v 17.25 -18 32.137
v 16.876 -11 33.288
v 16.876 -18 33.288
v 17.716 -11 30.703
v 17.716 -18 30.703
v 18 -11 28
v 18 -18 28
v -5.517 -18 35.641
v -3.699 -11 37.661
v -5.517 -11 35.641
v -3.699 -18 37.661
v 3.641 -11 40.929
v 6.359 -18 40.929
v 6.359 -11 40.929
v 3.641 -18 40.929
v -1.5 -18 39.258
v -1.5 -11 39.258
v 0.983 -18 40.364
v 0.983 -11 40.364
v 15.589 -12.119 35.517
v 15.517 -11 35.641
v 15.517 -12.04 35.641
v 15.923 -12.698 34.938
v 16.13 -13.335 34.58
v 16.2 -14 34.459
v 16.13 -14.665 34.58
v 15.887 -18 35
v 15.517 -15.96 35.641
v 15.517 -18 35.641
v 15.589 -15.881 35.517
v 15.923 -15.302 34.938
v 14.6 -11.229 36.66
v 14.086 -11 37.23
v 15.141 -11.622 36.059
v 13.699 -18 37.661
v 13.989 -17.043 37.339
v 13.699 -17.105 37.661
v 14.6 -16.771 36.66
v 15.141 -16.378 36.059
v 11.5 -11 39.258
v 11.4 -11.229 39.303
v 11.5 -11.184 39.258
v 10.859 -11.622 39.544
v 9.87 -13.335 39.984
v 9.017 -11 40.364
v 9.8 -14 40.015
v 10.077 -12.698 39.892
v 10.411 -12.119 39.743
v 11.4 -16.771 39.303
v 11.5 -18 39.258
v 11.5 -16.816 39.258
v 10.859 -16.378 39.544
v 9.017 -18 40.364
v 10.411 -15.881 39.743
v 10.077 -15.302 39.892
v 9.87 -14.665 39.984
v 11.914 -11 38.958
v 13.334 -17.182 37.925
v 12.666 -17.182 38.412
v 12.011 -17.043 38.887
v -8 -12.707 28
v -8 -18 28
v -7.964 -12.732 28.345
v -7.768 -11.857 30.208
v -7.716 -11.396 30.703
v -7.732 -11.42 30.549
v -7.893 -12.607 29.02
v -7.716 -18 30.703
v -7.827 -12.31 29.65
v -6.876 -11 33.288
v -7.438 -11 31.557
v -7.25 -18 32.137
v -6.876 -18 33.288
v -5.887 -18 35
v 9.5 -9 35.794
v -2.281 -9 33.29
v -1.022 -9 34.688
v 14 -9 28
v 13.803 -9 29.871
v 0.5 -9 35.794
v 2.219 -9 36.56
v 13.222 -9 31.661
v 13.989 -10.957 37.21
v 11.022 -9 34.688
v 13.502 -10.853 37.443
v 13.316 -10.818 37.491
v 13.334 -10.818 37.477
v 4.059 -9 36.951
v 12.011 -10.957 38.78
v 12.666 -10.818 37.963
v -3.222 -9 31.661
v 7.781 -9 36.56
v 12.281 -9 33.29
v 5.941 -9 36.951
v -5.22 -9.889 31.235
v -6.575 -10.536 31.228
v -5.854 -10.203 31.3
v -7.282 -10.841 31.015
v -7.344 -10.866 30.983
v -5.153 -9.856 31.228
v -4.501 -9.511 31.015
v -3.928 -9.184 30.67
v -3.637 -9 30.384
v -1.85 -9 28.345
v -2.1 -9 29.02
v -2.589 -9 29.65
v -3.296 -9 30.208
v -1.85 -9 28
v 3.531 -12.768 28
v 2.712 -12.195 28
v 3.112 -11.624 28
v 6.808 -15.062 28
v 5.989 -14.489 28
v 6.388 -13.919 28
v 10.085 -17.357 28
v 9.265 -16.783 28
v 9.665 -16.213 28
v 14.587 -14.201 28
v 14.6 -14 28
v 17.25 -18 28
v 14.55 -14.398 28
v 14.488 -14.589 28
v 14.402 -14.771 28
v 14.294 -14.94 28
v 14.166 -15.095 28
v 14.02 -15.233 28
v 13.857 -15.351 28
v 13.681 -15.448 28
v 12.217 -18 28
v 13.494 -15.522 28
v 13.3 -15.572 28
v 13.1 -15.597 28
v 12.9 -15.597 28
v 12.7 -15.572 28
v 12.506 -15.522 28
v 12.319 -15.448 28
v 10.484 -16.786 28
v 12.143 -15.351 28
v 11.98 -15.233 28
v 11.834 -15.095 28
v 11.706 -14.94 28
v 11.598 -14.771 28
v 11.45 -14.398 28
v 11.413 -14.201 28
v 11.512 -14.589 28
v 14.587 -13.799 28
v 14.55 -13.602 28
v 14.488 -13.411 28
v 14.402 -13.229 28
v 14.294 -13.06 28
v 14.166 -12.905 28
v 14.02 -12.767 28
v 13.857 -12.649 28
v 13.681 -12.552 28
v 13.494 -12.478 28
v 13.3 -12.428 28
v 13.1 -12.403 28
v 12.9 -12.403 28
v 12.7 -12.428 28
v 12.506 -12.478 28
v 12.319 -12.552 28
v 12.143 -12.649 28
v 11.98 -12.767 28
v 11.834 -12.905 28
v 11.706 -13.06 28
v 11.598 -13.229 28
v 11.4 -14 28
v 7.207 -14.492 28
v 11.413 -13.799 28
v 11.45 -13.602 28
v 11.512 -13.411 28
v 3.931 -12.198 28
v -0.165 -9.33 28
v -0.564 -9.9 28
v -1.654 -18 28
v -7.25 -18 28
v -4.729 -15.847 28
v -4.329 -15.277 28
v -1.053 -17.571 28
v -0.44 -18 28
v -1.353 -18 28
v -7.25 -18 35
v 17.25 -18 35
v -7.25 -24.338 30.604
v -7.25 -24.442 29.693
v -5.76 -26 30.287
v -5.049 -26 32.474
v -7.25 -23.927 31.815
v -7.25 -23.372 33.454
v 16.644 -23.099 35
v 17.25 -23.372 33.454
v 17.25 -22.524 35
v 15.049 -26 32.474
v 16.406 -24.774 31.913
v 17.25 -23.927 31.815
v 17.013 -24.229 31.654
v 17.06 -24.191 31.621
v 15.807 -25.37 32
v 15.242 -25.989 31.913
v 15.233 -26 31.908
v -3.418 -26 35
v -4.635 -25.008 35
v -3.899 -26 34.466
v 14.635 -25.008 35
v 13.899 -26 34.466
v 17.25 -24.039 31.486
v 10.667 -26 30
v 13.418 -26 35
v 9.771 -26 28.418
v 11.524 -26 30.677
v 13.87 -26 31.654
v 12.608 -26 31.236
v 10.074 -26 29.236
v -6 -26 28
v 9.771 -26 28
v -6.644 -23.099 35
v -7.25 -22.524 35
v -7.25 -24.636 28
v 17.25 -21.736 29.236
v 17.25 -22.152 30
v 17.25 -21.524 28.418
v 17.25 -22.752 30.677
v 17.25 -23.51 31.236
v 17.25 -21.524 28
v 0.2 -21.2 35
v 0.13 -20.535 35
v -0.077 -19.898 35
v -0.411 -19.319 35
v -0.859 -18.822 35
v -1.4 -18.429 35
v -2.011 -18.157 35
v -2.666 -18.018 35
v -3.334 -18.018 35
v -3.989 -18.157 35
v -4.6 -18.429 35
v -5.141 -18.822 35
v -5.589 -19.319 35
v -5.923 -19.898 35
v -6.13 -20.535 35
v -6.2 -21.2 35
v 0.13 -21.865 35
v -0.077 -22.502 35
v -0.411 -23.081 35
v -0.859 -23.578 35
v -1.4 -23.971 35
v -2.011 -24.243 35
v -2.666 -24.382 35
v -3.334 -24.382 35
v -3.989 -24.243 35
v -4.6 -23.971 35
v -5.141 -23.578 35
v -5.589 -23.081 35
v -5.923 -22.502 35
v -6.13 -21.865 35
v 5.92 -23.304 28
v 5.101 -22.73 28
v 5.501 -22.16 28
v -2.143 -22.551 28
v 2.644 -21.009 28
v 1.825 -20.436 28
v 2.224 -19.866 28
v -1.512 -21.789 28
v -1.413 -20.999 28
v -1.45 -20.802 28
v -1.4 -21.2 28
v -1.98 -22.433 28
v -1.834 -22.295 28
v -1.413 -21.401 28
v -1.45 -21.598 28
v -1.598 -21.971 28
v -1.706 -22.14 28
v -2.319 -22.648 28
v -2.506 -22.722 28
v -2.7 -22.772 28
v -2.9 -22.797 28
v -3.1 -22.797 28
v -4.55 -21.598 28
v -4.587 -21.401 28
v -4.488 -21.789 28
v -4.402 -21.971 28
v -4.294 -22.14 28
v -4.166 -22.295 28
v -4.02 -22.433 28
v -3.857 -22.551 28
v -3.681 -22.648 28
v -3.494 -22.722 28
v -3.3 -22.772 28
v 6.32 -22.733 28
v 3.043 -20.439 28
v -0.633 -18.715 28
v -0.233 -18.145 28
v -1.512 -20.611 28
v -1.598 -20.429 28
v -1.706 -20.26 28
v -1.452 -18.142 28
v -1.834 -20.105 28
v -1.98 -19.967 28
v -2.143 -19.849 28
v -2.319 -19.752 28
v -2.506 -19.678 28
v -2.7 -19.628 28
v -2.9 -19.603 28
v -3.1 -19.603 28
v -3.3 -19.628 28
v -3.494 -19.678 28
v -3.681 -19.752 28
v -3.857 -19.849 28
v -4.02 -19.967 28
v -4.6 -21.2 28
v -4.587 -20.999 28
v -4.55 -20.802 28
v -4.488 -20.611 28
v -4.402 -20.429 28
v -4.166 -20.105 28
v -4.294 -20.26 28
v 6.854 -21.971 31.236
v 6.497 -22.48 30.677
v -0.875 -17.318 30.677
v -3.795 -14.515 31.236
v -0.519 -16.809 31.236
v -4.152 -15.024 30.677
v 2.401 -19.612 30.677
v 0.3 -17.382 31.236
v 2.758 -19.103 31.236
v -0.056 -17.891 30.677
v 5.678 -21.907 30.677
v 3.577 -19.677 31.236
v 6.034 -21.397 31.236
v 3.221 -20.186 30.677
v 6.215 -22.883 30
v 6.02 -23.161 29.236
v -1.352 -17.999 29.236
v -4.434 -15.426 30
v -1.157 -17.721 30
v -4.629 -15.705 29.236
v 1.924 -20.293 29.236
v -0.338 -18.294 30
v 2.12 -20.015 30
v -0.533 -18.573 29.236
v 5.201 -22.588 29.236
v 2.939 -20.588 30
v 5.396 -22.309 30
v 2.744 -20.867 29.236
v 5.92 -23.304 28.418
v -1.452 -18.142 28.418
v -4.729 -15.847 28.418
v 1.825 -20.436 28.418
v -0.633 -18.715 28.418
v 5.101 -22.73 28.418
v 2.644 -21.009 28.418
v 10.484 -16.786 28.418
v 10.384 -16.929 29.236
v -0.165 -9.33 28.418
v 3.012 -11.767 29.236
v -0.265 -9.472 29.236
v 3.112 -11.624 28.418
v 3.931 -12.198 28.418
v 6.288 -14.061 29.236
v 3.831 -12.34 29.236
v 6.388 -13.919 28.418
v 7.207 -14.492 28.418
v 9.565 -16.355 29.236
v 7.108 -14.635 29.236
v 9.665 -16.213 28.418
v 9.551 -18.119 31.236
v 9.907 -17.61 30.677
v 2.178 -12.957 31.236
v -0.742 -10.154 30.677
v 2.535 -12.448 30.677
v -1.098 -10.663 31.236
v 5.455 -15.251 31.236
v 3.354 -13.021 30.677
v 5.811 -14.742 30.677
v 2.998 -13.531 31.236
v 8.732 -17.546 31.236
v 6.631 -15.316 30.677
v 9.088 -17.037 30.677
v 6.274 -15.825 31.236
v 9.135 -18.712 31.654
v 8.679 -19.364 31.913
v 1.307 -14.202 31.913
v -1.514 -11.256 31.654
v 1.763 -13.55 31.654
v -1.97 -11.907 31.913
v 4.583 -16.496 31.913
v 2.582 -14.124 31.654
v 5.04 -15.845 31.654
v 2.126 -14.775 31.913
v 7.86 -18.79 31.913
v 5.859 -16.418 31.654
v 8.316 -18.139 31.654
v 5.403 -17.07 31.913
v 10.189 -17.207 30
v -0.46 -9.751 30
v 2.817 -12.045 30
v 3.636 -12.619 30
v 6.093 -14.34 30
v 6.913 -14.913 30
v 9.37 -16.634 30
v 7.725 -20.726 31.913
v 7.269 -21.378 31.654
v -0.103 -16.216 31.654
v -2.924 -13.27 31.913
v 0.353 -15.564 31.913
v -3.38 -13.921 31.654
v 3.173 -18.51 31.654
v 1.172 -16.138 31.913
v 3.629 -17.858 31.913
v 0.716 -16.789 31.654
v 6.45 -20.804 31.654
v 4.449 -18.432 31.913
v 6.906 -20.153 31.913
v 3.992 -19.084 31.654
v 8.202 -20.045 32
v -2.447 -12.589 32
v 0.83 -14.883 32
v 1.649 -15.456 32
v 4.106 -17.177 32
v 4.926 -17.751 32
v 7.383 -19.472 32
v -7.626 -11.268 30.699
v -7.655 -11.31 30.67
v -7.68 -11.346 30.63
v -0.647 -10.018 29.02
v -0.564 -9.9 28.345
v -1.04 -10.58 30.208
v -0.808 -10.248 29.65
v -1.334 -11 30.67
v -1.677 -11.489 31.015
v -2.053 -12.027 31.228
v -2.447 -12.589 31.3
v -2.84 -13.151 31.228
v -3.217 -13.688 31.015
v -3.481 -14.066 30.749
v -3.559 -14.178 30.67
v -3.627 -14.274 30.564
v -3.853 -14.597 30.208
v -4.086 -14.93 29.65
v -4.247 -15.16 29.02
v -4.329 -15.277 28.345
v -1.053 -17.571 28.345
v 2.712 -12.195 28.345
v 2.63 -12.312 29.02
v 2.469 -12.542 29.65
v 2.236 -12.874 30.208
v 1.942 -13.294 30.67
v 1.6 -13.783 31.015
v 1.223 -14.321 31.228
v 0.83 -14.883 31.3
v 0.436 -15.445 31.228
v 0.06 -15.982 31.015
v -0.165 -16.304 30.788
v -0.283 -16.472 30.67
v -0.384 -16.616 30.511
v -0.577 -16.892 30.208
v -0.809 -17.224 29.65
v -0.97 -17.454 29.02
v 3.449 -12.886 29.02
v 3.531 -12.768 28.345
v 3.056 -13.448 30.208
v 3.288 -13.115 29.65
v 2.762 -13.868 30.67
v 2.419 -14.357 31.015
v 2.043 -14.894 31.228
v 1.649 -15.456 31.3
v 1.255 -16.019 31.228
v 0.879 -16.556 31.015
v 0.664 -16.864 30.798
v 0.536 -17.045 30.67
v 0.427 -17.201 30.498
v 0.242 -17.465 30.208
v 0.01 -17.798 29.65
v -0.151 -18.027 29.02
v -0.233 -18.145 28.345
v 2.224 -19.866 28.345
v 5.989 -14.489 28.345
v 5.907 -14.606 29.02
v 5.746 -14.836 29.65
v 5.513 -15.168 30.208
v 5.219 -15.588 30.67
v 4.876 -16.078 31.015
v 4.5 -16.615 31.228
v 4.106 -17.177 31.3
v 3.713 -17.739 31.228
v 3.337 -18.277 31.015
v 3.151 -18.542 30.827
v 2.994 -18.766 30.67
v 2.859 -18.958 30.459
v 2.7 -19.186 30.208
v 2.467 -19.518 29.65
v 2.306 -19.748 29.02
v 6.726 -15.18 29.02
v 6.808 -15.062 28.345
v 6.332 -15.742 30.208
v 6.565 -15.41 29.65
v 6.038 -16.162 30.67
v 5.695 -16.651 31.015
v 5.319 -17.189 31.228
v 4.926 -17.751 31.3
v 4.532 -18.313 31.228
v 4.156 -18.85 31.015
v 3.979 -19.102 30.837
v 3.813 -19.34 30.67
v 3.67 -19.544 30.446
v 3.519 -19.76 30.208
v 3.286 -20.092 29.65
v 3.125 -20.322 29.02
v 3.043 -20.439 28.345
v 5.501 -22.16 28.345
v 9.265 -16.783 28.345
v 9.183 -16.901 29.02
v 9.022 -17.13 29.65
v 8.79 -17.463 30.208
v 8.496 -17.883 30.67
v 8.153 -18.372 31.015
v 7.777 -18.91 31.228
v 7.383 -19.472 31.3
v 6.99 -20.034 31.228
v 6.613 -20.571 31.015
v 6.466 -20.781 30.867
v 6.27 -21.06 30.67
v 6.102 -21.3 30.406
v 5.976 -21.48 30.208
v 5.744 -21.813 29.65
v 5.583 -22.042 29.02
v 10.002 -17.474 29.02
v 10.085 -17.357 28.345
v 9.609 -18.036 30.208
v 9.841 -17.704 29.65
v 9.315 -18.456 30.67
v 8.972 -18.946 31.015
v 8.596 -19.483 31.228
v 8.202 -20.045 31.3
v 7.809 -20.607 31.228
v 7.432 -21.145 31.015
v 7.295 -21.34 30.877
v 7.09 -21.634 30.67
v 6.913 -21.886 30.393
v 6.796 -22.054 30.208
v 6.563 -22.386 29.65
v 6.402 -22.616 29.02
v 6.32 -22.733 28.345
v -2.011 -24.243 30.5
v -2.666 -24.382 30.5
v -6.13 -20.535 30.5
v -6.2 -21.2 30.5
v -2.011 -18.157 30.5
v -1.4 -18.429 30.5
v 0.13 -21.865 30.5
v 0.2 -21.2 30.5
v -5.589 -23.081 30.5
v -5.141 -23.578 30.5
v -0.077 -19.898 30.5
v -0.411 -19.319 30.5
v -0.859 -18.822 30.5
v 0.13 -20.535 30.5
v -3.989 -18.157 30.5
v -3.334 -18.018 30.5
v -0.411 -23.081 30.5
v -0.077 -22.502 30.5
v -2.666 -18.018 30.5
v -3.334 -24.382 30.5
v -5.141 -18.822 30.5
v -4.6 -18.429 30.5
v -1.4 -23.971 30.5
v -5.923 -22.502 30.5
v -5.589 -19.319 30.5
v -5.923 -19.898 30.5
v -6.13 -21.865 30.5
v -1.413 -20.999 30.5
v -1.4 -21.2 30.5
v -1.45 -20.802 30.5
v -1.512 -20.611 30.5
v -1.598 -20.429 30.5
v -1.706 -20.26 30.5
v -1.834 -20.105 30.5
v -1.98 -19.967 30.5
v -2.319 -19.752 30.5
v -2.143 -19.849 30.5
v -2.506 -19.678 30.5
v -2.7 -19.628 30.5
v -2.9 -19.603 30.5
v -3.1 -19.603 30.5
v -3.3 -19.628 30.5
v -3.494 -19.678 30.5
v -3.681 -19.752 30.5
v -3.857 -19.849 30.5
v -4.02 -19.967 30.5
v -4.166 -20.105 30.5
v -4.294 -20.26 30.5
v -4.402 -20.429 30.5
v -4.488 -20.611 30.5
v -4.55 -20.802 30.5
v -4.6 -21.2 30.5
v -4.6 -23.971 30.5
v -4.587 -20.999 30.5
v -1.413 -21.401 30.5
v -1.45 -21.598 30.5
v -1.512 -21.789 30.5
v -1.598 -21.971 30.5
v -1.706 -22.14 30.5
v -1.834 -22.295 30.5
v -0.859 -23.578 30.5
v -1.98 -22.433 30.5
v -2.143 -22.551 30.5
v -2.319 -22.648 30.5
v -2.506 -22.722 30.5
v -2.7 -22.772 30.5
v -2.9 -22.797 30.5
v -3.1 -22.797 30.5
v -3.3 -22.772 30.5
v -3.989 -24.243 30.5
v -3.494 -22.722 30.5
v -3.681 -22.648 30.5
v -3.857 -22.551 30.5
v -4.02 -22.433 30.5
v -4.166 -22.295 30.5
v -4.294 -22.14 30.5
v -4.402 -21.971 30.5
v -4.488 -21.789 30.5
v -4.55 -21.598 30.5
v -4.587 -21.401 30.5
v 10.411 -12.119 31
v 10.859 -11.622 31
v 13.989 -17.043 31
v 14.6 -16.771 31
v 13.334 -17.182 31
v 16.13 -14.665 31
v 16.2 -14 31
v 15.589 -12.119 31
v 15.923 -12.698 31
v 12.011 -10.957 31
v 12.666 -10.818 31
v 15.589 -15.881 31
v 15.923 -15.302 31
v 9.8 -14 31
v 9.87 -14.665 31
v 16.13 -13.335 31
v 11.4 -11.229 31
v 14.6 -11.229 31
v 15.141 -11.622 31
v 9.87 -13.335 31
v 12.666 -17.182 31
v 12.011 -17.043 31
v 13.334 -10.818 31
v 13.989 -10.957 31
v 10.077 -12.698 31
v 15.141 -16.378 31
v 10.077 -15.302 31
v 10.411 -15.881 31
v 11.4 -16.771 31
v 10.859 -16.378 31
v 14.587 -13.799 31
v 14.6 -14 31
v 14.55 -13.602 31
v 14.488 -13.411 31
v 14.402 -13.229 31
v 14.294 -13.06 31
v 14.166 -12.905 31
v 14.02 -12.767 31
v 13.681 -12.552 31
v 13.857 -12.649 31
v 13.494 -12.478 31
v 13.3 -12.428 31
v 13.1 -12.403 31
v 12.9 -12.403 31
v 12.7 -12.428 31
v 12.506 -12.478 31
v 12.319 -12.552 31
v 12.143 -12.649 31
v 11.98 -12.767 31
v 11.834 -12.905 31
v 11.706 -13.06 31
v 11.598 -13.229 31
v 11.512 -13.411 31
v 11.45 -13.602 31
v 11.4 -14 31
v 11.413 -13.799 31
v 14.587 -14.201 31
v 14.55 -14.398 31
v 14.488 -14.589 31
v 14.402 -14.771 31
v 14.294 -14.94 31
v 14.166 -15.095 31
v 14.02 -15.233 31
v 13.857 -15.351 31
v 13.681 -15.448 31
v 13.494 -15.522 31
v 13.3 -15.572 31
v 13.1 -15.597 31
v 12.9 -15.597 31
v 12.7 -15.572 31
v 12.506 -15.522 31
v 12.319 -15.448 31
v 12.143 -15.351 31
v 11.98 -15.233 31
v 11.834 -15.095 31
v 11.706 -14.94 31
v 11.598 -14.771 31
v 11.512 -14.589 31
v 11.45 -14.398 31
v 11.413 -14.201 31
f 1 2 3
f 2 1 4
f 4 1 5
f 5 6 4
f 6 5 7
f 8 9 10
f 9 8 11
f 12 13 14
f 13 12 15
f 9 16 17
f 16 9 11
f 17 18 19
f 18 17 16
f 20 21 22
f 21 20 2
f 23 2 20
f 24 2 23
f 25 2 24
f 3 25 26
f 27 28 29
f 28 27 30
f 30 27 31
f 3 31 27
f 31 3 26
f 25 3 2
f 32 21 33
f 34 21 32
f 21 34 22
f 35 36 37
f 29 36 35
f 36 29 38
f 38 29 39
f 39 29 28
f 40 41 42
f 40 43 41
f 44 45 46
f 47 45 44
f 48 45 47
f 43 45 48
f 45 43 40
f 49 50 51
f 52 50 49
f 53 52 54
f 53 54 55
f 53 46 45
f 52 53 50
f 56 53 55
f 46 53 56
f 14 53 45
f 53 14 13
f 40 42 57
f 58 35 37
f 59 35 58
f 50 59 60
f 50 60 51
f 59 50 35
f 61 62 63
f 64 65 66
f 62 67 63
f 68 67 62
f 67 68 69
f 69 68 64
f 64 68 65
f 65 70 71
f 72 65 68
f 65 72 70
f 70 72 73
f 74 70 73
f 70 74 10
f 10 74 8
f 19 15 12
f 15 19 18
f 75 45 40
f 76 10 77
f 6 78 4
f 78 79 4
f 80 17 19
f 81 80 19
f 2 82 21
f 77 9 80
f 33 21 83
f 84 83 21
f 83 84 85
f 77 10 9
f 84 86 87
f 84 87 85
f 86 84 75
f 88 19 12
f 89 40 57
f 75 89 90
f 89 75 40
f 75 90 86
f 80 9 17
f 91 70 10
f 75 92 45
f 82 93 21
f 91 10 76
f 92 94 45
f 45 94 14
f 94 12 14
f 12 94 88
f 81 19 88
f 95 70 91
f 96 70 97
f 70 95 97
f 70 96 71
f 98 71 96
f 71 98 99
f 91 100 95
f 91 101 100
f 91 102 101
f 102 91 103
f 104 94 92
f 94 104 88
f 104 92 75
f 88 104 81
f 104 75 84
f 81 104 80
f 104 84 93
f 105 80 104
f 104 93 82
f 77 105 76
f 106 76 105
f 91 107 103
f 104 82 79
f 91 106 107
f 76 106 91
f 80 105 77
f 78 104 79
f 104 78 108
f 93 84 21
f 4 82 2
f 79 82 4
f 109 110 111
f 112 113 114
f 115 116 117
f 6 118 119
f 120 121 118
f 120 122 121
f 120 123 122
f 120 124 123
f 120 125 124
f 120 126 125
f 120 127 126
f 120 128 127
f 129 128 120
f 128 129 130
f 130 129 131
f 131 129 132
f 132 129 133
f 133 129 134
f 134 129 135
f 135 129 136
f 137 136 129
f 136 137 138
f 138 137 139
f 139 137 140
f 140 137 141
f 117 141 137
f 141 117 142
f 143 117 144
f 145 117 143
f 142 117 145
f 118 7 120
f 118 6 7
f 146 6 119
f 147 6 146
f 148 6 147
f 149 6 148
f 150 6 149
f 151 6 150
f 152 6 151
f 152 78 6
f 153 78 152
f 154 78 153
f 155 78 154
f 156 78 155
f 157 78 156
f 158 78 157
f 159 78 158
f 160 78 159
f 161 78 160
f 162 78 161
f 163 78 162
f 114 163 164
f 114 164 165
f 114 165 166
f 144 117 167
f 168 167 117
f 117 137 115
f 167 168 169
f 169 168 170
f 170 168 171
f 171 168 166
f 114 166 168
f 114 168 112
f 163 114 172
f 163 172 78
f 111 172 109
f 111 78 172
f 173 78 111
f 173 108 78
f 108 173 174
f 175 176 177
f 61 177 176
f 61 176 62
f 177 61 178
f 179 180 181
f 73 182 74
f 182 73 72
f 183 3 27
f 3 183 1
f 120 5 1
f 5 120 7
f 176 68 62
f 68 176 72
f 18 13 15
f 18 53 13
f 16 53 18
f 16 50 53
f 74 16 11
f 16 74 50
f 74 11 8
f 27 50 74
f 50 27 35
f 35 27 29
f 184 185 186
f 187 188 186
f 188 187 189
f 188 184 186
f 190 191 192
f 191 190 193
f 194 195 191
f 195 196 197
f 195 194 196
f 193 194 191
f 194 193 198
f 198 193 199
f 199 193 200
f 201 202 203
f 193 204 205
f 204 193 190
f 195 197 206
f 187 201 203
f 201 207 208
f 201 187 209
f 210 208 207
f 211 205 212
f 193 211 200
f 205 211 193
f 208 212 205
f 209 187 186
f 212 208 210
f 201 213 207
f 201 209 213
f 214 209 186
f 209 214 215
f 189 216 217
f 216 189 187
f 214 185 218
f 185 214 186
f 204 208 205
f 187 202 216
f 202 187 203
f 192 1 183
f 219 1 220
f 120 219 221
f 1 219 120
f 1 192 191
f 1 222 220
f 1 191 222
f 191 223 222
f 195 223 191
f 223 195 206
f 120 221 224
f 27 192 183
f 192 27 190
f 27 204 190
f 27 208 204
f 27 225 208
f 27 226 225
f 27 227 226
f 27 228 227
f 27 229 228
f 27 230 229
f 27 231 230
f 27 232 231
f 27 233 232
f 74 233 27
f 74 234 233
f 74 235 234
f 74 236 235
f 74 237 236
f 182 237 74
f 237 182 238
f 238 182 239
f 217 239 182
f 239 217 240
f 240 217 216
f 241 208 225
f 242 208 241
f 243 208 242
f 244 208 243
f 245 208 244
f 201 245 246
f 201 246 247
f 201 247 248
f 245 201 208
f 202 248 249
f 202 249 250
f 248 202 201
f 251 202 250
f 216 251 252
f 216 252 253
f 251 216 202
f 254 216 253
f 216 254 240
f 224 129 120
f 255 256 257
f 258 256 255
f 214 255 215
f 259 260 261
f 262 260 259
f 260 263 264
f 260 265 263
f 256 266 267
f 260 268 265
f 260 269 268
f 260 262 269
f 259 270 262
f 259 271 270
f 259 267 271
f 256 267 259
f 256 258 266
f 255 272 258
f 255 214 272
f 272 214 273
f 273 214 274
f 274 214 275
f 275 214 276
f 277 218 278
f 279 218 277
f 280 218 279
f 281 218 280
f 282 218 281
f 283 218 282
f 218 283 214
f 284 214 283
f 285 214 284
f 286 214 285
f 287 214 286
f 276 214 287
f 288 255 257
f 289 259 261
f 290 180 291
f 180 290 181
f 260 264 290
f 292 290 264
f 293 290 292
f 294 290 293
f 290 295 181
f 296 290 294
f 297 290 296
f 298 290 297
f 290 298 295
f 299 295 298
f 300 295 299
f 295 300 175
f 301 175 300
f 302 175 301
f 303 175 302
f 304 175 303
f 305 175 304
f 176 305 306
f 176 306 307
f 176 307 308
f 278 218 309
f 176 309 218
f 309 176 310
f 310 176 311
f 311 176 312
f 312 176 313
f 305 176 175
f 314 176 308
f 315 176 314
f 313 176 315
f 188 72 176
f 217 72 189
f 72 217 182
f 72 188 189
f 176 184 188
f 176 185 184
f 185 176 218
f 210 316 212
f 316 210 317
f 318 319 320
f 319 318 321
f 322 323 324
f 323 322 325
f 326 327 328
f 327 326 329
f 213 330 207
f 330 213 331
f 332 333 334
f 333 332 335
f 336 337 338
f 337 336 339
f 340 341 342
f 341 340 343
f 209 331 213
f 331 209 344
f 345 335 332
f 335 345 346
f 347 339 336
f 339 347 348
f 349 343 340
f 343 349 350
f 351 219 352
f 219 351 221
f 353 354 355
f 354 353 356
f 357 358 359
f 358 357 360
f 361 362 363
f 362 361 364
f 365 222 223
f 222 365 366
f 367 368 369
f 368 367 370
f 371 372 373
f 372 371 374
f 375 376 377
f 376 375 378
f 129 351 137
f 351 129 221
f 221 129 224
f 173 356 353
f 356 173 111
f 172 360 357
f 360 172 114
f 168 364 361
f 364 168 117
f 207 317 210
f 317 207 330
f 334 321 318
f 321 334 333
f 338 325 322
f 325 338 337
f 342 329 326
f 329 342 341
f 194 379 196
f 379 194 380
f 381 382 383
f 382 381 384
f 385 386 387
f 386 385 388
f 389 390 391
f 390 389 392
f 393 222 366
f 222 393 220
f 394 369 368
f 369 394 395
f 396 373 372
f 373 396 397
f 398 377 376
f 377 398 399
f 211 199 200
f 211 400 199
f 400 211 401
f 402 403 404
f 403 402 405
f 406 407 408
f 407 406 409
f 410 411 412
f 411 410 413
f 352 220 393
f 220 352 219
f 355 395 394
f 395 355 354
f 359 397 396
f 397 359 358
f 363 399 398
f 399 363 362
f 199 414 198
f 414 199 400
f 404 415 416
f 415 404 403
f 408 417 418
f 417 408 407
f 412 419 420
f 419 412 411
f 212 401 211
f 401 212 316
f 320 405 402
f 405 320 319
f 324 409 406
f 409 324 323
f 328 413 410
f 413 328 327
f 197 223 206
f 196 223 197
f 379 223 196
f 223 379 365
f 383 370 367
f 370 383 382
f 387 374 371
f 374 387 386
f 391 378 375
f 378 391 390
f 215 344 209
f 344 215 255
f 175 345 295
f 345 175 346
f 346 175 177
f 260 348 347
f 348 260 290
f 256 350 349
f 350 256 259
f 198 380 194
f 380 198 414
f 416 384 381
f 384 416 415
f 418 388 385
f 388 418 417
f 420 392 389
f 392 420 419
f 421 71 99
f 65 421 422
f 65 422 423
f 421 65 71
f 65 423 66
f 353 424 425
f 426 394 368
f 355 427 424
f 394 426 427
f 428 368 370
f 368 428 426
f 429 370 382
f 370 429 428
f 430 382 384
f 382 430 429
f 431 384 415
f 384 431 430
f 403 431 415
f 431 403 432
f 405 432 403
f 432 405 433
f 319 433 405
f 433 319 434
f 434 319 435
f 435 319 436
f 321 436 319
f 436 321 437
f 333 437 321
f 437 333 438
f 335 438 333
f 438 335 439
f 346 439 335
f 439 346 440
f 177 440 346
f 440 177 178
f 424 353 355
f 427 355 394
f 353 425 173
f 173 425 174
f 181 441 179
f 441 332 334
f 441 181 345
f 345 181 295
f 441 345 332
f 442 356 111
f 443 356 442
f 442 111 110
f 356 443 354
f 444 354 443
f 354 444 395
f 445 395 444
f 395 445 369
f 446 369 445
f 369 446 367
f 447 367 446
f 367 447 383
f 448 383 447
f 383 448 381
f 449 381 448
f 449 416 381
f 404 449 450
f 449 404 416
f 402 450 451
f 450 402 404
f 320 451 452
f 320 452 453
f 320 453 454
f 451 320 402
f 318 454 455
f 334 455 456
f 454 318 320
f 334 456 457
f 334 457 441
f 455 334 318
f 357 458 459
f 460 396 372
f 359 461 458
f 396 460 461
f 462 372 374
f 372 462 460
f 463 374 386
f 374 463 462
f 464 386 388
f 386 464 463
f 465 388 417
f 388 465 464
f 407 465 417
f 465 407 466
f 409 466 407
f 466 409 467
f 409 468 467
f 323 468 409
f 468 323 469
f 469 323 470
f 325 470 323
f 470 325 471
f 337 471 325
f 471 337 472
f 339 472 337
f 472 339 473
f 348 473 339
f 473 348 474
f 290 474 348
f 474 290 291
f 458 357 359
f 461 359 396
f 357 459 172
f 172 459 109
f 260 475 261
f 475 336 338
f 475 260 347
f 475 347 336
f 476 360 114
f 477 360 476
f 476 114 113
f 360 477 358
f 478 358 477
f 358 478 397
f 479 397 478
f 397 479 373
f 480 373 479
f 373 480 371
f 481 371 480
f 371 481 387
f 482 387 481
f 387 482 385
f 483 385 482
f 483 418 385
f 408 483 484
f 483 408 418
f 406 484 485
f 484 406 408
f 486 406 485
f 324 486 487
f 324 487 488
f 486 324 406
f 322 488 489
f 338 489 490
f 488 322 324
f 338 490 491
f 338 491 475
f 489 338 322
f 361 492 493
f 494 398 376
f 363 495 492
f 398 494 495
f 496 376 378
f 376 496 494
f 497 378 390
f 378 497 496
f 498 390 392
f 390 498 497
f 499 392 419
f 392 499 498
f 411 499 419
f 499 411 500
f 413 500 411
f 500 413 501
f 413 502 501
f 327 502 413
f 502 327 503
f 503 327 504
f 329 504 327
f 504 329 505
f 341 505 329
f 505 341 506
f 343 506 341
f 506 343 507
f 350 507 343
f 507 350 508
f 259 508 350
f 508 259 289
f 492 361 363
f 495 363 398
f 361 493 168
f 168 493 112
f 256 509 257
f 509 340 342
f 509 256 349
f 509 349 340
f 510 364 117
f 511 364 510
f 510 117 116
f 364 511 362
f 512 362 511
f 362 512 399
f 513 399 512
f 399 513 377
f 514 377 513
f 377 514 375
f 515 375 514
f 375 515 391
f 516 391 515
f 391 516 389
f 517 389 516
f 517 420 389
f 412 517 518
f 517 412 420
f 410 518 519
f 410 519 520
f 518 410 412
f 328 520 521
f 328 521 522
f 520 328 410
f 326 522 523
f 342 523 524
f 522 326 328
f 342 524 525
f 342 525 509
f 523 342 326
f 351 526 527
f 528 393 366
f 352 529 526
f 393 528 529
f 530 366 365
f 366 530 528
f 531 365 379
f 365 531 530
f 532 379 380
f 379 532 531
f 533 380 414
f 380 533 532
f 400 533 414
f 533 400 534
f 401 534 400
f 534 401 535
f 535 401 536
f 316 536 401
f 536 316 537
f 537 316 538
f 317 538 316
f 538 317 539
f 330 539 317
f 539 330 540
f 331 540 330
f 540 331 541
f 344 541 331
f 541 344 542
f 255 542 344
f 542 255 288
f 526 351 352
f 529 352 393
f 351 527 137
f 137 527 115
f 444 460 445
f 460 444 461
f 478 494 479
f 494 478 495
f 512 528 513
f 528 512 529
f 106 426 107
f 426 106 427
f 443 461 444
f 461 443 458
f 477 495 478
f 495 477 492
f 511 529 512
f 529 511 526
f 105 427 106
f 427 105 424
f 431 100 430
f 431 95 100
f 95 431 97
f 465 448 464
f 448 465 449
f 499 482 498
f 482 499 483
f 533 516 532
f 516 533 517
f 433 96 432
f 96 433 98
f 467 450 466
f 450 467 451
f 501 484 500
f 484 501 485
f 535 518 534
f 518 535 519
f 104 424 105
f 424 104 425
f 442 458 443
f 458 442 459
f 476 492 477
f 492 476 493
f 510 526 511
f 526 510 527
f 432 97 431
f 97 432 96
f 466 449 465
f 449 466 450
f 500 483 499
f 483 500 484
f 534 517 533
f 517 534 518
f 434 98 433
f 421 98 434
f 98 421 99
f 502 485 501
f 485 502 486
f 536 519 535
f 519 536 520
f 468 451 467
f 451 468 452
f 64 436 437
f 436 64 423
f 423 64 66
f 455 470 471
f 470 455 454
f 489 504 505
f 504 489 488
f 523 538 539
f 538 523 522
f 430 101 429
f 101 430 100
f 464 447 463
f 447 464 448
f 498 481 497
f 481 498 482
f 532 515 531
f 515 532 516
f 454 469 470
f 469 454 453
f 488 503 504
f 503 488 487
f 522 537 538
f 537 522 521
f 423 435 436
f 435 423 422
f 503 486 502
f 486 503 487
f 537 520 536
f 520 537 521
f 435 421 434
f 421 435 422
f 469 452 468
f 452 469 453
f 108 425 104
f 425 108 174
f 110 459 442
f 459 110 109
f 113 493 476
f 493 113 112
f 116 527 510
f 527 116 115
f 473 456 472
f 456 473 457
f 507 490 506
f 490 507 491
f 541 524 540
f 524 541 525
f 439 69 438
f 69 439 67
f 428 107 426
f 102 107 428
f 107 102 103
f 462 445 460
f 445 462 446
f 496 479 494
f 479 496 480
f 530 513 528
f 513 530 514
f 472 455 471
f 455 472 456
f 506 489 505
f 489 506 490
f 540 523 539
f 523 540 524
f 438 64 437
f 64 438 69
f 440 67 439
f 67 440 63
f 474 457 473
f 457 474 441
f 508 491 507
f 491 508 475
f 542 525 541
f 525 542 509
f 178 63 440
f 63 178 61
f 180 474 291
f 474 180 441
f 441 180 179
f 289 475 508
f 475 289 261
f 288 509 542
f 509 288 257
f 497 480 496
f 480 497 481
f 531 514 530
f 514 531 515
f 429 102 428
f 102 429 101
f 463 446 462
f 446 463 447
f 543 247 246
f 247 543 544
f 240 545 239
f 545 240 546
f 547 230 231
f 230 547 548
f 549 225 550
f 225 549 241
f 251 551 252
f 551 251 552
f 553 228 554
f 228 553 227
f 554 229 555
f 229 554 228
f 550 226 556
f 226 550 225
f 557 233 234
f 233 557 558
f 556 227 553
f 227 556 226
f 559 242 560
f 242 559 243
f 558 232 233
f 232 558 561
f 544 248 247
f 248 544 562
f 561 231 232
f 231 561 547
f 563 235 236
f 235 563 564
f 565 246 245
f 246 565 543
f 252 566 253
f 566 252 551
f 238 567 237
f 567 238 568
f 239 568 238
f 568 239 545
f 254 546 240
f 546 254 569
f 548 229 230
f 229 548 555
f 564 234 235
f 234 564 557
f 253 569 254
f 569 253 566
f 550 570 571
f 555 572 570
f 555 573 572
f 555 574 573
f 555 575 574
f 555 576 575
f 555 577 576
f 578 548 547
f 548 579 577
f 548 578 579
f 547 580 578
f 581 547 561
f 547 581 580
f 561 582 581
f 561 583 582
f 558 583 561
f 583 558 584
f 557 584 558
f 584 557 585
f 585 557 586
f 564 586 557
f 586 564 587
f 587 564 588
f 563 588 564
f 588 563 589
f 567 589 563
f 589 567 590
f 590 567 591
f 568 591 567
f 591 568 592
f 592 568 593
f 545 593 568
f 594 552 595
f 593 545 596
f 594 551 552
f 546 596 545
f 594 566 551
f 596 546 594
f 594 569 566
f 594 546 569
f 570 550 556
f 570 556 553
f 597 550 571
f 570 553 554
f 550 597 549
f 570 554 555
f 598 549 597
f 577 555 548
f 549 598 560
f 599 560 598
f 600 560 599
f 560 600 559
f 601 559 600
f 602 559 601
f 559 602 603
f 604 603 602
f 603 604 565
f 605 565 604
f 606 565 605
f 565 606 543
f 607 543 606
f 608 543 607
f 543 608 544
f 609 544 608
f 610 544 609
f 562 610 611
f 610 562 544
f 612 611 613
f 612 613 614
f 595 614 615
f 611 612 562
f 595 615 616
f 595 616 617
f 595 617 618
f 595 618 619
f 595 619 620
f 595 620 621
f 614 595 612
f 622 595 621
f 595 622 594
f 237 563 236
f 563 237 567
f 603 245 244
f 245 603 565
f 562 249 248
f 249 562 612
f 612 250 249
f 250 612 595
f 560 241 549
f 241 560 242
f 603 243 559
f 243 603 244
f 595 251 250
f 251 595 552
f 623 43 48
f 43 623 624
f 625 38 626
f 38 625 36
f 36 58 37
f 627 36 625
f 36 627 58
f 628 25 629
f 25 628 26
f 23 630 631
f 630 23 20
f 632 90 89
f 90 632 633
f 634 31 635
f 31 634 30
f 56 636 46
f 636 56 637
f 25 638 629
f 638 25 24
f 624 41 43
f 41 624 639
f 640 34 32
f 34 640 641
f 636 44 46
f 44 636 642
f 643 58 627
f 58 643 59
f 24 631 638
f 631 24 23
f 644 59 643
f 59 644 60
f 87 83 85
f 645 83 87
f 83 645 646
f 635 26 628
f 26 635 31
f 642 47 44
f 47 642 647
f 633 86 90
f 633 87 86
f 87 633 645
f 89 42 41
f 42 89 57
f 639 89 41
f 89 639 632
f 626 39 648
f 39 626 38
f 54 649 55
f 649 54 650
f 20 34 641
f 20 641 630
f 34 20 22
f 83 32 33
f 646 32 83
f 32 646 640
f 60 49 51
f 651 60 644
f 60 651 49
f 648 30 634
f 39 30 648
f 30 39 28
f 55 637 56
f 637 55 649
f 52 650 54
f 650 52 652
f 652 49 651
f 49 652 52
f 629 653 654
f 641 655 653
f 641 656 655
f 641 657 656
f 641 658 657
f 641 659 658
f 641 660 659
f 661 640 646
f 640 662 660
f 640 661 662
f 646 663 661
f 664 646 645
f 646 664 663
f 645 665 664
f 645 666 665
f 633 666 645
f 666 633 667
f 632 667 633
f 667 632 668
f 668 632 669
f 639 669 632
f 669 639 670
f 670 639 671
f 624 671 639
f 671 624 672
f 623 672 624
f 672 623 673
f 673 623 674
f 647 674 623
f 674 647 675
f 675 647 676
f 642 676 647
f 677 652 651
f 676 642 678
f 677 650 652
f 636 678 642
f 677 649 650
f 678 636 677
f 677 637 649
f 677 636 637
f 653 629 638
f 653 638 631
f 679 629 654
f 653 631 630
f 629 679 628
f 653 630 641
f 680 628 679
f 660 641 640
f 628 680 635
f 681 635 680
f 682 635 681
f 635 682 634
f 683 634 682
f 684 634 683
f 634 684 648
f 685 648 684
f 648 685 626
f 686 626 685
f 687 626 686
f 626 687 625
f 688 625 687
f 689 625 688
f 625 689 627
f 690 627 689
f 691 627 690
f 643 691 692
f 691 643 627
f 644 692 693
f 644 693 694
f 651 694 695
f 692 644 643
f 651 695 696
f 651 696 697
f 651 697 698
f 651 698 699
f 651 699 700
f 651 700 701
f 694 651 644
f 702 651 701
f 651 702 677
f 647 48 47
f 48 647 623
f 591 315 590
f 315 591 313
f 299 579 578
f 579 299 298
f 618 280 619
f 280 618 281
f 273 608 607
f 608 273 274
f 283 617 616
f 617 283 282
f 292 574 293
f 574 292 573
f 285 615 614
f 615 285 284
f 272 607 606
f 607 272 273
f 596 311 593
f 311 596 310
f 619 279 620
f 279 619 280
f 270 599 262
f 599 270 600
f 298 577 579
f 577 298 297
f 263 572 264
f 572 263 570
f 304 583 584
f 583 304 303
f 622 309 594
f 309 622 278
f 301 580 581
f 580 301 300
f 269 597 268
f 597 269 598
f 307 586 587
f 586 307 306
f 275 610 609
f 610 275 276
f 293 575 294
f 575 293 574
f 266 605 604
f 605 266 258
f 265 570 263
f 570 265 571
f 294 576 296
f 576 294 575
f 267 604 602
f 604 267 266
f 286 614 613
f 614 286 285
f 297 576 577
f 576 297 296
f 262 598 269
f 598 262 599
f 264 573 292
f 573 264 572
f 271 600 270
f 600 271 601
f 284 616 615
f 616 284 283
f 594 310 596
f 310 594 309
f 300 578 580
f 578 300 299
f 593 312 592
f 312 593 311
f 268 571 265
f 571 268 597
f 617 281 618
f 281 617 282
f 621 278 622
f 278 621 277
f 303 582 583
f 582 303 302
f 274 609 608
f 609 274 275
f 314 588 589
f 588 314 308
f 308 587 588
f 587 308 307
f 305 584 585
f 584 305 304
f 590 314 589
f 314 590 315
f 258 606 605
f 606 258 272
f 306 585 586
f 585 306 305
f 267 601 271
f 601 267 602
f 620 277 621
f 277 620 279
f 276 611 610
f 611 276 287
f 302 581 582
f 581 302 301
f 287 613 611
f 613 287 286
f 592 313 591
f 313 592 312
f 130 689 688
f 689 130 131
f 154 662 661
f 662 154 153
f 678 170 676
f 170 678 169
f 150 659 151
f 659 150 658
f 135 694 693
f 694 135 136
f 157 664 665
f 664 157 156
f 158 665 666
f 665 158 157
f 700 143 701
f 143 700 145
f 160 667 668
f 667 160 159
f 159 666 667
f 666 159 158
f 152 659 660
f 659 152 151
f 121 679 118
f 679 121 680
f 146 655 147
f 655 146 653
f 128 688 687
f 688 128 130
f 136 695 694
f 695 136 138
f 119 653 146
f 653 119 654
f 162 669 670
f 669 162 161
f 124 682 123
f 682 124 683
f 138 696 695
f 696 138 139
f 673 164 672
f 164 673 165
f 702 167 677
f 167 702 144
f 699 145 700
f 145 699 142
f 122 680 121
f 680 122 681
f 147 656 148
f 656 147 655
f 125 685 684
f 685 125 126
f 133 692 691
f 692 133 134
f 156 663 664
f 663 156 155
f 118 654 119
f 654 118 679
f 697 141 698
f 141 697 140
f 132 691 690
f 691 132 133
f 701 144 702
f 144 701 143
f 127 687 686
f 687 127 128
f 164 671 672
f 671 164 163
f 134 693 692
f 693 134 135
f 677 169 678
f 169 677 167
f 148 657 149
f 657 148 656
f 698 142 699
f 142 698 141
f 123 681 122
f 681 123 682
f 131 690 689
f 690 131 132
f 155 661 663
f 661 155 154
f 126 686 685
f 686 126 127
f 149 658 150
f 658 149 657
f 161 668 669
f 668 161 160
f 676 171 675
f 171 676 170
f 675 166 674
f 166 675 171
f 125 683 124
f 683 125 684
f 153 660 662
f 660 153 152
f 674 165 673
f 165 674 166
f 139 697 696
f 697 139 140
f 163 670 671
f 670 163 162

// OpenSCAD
// PRUSA iteration4
// Heatbed cable clip
// GNU GPL v3
// Josef Průša <iam@josefprusa.cz> and contributors
// http://www.reprap.org/wiki/Prusa_Mendel
// http://prusamendel.org

module heatbed_cable_clip() {

  difference() {

    union() {
      difference() {
        union() {
          // body base
          translate([75, 99, 28]) rotate([90, 0, 0]) cylinder(h=15, r=13, $fn=30);
          translate([75, 101, 28]) rotate([90, 0, 0]) cylinder(h=2, r1=9, r2=13, $fn=30);
        }

        // cut flat and shape
        translate([60, 82, 14]) cube([30, 20, 14]);
        translate([60, 72, 20]) cube([30, 20, 30]);
      }

      difference() {
        translate([62.75, 84, 28]) cube([24.5, 8, 7]);
        difference() {
          translate([75, 85, 28]) rotate([90, 0, 0]) cube([30, 20, 10], center=true);
          translate([75, 90, 28]) rotate([90, 0, 0]) cylinder(h=6, r1=16.5, r2=11, $fn=30);
        }
      }
    }

    // cable opening
    translate([61, 102, 28]) rotate([35, 90, 0])

        difference() {

          cylinder(h=35, r=4, $fn=30);

          translate([0, 0, 3]) cylinder(h=5, r=4, $fn=30);
          translate([0, 0, 12]) cylinder(h=1, r=4, $fn=30);
          translate([0, 0, 16]) cylinder(h=1, r=4, $fn=30);
          translate([0, 0, 20]) cylinder(h=1, r=4, $fn=30);
        }
    translate([61, 102, 28]) rotate([35, 90, 0]) cylinder(h=35, r=3.3, $fn=30);

    // screw heads
    translate([67, 88.8, 30.5]) rotate([0, 0, 0]) cylinder(h=10, r=3.2, $fn=30);
    translate([83, 96, 31]) rotate([0, 0, 0]) cylinder(h=10, r=3.2, $fn=30);

    // screws
    translate([67, 88.8, 14]) rotate([0, 0, 0]) cylinder(h=35, r=1.6, $fn=50);
    translate([83, 96, 14]) rotate([0, 0, 0]) cylinder(h=35, r=1.6, $fn=50);
  }
}

translate([-70, -110, 0]) heatbed_cable_clip();
